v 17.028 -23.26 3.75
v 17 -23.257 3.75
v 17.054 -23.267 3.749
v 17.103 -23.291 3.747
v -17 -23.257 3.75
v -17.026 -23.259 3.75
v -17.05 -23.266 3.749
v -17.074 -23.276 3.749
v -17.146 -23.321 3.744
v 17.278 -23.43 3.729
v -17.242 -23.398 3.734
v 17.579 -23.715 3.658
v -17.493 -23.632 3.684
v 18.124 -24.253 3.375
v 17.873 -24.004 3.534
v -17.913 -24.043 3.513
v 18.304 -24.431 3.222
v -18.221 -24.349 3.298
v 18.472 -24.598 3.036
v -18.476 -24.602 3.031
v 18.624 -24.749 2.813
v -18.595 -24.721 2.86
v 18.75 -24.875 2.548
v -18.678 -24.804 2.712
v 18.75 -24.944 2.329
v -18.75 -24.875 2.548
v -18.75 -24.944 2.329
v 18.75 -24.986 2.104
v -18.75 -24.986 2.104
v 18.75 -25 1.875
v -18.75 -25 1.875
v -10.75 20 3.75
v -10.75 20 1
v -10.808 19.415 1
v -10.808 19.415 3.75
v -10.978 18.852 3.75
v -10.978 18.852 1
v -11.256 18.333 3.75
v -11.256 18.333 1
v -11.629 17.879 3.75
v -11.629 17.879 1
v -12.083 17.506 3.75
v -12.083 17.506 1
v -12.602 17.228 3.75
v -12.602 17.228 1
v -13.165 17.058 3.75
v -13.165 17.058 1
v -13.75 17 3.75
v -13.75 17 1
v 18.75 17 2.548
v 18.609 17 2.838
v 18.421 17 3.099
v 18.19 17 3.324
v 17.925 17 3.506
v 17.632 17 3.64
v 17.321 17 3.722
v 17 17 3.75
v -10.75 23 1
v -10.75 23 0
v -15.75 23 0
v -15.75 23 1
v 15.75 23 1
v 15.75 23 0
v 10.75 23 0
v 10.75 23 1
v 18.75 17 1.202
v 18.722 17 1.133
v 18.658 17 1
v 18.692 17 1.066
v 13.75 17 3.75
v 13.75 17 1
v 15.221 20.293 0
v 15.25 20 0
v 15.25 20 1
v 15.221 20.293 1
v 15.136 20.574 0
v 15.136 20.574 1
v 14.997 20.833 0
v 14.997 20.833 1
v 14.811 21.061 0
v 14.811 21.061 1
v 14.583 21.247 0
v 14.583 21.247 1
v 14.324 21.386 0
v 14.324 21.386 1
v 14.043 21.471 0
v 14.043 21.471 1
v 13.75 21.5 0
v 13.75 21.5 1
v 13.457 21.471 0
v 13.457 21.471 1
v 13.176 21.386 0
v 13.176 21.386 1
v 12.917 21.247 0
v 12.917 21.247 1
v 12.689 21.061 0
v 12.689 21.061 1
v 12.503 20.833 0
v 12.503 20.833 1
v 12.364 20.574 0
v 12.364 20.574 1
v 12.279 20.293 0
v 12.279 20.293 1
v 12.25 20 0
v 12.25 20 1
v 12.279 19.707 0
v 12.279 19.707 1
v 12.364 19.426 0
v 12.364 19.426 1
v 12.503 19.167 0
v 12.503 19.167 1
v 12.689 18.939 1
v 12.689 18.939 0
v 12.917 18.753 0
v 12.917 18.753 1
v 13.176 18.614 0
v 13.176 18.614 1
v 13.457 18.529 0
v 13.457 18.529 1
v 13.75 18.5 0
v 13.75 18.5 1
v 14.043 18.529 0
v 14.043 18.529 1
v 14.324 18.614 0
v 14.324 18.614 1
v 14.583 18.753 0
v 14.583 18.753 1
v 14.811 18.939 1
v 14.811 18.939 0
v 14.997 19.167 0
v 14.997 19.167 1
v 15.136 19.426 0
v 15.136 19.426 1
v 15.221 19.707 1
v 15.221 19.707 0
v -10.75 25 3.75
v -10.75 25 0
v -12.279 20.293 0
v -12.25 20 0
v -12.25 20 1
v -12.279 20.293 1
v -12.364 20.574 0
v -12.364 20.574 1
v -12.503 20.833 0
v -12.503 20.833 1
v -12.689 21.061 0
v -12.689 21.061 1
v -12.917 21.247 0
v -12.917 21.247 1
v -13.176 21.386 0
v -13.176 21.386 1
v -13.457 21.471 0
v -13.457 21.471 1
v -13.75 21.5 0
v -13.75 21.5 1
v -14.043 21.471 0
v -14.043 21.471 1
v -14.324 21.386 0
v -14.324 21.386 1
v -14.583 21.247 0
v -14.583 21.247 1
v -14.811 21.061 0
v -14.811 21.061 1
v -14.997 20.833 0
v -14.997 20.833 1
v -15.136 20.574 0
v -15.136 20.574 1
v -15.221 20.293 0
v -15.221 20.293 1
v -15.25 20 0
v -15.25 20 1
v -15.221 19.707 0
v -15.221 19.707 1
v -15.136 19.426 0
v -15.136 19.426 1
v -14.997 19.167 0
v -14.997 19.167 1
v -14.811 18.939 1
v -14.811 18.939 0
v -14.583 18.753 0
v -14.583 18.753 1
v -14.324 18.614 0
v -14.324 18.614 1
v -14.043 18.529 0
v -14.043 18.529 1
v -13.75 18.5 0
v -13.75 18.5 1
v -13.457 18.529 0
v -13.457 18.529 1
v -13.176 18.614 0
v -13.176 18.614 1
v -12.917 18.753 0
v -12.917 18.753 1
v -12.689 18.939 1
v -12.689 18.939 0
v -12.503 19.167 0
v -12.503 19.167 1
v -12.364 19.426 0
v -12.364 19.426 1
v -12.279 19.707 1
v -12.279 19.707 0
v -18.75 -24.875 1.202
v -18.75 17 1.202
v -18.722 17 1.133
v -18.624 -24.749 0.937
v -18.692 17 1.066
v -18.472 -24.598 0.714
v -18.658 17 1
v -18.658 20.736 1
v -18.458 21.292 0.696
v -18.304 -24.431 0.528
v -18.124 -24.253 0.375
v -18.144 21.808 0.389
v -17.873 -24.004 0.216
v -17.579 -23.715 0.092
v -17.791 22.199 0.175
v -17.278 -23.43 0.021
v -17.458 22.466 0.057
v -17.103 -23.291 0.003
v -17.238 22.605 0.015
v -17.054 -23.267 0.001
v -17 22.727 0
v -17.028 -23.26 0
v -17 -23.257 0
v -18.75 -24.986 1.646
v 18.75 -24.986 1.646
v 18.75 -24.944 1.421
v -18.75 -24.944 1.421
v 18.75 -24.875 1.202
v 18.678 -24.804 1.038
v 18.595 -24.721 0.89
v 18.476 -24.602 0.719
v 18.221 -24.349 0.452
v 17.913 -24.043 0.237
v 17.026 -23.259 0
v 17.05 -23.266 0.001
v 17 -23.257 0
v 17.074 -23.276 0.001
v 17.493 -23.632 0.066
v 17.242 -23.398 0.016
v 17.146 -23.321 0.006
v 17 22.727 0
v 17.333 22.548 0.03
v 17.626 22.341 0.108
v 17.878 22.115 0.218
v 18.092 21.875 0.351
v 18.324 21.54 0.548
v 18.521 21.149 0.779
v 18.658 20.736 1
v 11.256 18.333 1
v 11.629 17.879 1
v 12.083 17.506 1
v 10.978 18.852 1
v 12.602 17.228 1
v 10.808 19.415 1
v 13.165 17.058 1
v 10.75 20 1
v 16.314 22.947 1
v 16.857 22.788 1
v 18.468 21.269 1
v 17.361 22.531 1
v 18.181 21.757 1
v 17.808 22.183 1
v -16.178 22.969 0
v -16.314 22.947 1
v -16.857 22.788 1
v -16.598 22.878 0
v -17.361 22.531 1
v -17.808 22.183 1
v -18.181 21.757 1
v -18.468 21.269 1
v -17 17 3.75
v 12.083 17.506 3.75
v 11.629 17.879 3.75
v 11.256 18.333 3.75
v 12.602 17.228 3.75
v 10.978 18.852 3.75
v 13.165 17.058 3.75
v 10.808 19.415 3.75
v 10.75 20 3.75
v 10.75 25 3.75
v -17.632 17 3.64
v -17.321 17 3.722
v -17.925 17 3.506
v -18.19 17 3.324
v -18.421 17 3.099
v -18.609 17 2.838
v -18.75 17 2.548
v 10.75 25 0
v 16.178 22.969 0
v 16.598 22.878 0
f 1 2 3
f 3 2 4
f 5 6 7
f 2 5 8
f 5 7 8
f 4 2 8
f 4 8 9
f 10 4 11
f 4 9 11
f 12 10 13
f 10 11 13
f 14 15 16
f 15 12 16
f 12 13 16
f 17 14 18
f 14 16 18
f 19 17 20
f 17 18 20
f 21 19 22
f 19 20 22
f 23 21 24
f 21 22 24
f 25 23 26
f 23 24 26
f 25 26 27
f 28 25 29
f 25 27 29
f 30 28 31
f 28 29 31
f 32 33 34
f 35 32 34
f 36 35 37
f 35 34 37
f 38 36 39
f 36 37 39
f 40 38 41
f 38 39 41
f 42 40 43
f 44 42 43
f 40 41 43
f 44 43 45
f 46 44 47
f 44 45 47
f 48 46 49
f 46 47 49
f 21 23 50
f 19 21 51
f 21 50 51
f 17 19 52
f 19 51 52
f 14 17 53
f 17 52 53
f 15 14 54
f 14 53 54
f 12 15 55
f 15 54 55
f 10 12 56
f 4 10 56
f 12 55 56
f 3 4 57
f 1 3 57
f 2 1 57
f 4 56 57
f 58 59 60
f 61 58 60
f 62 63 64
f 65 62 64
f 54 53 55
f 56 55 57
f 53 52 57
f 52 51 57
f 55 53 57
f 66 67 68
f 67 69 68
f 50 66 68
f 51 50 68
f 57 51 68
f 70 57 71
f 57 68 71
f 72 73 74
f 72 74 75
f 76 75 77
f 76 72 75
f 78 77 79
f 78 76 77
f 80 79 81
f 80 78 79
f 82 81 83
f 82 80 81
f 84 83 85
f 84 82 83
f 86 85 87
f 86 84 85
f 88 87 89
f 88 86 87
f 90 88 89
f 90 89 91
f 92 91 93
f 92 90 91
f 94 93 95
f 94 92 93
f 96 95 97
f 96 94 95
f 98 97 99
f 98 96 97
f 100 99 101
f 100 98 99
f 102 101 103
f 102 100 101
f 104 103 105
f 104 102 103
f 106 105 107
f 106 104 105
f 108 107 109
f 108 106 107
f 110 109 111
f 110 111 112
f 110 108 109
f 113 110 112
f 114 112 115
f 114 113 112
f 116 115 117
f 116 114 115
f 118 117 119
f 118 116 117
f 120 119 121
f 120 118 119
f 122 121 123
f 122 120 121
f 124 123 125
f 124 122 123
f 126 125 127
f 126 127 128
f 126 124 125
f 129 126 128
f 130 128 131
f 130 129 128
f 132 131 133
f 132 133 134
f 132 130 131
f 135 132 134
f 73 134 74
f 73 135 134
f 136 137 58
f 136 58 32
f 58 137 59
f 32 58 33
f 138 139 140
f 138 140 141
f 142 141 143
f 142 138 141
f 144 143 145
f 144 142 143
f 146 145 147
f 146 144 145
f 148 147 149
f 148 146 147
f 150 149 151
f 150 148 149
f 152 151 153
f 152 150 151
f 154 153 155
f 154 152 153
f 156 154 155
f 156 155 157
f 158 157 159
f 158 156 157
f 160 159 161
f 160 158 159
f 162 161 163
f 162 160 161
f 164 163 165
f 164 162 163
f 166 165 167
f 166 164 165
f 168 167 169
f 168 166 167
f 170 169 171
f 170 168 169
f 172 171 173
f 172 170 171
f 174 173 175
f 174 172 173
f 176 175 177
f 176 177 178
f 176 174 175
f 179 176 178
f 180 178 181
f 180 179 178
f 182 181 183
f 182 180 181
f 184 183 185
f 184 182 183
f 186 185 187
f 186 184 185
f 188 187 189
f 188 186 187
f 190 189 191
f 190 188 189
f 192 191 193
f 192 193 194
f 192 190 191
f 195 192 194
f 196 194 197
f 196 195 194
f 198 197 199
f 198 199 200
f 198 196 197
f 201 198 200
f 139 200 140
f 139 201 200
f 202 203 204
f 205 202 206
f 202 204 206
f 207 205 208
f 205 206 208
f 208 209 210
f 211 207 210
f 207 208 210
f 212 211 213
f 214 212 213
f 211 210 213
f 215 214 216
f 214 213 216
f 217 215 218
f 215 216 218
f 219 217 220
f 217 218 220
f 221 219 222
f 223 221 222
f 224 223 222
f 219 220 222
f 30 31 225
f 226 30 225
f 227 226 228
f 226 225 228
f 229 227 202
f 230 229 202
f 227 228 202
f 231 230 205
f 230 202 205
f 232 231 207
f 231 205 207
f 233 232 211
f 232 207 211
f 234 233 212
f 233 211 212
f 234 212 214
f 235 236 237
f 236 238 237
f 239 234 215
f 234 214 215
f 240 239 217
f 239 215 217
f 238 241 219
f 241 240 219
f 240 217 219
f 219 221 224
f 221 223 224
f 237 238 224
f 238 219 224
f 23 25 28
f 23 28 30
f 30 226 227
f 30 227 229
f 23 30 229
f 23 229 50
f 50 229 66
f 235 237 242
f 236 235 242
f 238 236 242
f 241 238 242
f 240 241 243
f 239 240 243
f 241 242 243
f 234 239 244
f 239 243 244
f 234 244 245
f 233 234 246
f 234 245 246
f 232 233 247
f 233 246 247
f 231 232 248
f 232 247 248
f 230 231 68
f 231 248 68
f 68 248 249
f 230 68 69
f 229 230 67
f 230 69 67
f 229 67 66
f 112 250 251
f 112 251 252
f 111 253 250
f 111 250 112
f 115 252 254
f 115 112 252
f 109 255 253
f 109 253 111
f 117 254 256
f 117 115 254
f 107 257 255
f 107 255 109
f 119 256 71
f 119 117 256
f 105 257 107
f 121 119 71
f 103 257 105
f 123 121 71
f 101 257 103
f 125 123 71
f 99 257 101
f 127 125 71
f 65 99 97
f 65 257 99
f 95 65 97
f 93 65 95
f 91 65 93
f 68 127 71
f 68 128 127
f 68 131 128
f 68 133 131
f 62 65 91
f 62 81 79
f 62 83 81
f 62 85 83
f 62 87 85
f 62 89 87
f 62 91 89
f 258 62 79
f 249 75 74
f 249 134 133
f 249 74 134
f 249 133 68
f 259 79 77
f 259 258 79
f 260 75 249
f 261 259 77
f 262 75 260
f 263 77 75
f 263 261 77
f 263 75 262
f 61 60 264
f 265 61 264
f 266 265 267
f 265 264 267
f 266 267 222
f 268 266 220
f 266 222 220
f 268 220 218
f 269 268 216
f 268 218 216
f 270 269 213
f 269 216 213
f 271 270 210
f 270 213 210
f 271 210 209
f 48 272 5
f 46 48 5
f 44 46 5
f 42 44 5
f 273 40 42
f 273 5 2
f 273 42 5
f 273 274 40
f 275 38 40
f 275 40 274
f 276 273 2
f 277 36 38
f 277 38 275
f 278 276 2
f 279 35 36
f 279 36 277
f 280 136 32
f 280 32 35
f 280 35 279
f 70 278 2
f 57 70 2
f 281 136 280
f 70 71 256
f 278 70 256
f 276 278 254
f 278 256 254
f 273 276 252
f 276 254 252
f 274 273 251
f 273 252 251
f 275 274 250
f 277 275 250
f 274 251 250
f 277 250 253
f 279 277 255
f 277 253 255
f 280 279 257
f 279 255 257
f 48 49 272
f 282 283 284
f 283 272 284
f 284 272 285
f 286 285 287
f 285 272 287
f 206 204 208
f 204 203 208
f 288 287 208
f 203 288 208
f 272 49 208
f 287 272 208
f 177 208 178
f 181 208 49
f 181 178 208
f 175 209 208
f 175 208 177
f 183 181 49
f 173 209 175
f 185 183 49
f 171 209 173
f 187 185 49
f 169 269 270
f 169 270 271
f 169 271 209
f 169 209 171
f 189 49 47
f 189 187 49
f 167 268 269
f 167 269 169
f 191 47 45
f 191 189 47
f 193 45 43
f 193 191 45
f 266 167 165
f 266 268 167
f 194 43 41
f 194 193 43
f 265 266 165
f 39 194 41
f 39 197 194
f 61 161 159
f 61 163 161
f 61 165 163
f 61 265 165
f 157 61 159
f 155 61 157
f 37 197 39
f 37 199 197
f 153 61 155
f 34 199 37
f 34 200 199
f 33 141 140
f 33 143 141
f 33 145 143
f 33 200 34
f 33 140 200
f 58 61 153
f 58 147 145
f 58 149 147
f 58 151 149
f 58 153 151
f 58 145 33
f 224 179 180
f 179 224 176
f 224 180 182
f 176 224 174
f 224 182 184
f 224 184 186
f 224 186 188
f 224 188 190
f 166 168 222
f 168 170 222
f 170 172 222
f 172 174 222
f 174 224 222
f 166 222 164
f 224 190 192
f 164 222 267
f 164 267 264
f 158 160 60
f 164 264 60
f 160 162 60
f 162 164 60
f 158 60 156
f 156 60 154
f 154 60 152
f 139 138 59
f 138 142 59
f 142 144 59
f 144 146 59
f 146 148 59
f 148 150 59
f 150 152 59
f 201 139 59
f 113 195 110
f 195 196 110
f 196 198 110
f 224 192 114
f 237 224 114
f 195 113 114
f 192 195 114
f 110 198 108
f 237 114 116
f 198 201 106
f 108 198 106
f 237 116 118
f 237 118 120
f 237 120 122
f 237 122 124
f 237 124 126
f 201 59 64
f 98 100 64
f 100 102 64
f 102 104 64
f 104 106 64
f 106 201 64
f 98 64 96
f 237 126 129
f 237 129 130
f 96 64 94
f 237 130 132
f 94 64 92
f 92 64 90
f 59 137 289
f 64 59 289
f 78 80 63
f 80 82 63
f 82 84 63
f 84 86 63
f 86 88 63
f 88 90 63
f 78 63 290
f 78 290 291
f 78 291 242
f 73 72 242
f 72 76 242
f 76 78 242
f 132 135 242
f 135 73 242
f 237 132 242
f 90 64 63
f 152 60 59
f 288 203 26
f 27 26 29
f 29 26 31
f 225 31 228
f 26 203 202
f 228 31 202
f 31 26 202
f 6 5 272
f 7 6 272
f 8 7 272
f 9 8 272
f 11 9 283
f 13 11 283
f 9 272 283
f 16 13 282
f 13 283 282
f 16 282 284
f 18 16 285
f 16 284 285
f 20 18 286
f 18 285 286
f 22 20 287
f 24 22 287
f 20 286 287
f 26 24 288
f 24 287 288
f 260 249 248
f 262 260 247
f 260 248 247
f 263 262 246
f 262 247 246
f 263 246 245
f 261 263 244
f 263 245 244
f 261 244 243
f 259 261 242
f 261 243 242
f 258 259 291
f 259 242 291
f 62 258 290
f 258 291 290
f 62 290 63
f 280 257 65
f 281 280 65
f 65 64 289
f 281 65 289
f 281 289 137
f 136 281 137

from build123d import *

# Parameters (mm, degrees)
RESSALTO_EXTRUS_O1_DEPTH = 3.75
ESBO_O1_3_R              = 1.5
RESSALTO_EXTRUS_O2_DEPTH = 1
CORTE_EXTRUS_O1_DEPTH    = 46.225131288
CORTE_EXTRUS_O2_DEPTH    = 54.531532763


with BuildPart() as part:
    # Esboço1 → Ressalto-extrusão1 (new body)
    with BuildSketch(Plane.XY):
        with BuildLine():
            Line((10.75, 25), (-10.75, 25))
            Line((-10.75, 25), (-10.75, 23))
            Line((-10.75, 23), (-10.75, 20))
            ThreePointArc((-10.75, 20), (-11.628679656, 17.878679656), (-13.75, 17))
            Line((-13.75, 17), (-18.75, 17))
            Line((-18.75, 17), (-18.75, -25))
            Line((-18.75, -25), (18.75, -25))
            Line((18.75, -25), (18.75, 17))
            Line((18.75, 17), (13.75, 17))
            ThreePointArc((13.75, 17), (11.628679656, 17.878679656), (10.75, 20))
            Line((10.75, 20), (10.75, 23))
            Line((10.75, 23), (10.75, 25))
        make_face()
    extrude(amount=RESSALTO_EXTRUS_O1_DEPTH)

    # Esboço1<3> → Ressalto-extrusão2 (add)
    # profile 1 of 2: a face of its own
    with BuildSketch(Plane.XY):
        with BuildLine():
            Line((-10.75, 20), (-10.75, 23))
            Line((-10.75, 23), (-15.75, 23))
            ThreePointArc((-15.75, 23), (-17.871320344, 22.121320344), (-18.75, 20))
            Line((-18.75, 20), (-18.75, 17))
            Line((-18.75, 17), (-13.75, 17))
            ThreePointArc((-13.75, 17), (-11.628679656, 17.878679656), (-10.75, 20))
        make_face()
        with Locations((-13.75, 20)):
            Circle(ESBO_O1_3_R, mode=Mode.SUBTRACT)
    # profile 2 of 2: a face of its own
    with BuildSketch(Plane.XY):
        with BuildLine():
            Line((15.75, 23), (10.75, 23))
            Line((10.75, 23), (10.75, 20))
            ThreePointArc((10.75, 20), (11.628679656, 17.878679656), (13.75, 17))
            Line((13.75, 17), (18.75, 17))
            Line((18.75, 17), (18.75, 20))
            ThreePointArc((18.75, 20), (17.871320344, 22.121320344), (15.75, 23))
        make_face()
        with Locations((13.75, 20)):
            Circle(ESBO_O1_3_R, mode=Mode.SUBTRACT)
    extrude(amount=RESSALTO_EXTRUS_O2_DEPTH)

    # Esboço3 → Corte-extrusão1 (cut, through all)
    with BuildSketch(Plane.ZY.offset(18.75)):
        with BuildLine():
            ThreePointArc((1.875, -25), (0.595000227, -24.49695337), (0, -23.257021896))
            Line((0, -23.257021896), (0, -25))
            Line((0, -25), (1.875, -25))
        make_face()
        with BuildLine():
            ThreePointArc((3.75, -23.257021896), (3.154999773, -24.49695337), (1.875, -25))
            Line((1.875, -25), (3.75, -25))
            Line((3.75, -25), (3.75, -23.257021896))
        make_face()
    extrude(amount=-CORTE_EXTRUS_O1_DEPTH, mode=Mode.SUBTRACT)

    # Esboço4 → Corte-extrusão2 (cut, through all)
    with BuildSketch(Plane(origin=(0, 25, 0), x_dir=(1, 0, 0), z_dir=(0, 1, 0))):
        with BuildLine():
            Line((17, -4.75), (-17, -4.75))
            ThreePointArc((-17, -4.75), (-19.875, -1.875), (-17, 1))
            Line((-17, 1), (17, 1))
            ThreePointArc((17, 1), (19.875, -1.875), (17, -4.75))
        make_face()
        with BuildLine():
            Line((17, -3.75), (-17, -3.75))
            ThreePointArc((-17, -3.75), (-18.875, -1.875), (-17, 0))
            Line((-17, 0), (17, 0))
            ThreePointArc((17, 0), (18.875, -1.875), (17, -3.75))
        make_face(mode=Mode.SUBTRACT)
    extrude(amount=-CORTE_EXTRUS_O2_DEPTH, mode=Mode.SUBTRACT)


solid = part.part
